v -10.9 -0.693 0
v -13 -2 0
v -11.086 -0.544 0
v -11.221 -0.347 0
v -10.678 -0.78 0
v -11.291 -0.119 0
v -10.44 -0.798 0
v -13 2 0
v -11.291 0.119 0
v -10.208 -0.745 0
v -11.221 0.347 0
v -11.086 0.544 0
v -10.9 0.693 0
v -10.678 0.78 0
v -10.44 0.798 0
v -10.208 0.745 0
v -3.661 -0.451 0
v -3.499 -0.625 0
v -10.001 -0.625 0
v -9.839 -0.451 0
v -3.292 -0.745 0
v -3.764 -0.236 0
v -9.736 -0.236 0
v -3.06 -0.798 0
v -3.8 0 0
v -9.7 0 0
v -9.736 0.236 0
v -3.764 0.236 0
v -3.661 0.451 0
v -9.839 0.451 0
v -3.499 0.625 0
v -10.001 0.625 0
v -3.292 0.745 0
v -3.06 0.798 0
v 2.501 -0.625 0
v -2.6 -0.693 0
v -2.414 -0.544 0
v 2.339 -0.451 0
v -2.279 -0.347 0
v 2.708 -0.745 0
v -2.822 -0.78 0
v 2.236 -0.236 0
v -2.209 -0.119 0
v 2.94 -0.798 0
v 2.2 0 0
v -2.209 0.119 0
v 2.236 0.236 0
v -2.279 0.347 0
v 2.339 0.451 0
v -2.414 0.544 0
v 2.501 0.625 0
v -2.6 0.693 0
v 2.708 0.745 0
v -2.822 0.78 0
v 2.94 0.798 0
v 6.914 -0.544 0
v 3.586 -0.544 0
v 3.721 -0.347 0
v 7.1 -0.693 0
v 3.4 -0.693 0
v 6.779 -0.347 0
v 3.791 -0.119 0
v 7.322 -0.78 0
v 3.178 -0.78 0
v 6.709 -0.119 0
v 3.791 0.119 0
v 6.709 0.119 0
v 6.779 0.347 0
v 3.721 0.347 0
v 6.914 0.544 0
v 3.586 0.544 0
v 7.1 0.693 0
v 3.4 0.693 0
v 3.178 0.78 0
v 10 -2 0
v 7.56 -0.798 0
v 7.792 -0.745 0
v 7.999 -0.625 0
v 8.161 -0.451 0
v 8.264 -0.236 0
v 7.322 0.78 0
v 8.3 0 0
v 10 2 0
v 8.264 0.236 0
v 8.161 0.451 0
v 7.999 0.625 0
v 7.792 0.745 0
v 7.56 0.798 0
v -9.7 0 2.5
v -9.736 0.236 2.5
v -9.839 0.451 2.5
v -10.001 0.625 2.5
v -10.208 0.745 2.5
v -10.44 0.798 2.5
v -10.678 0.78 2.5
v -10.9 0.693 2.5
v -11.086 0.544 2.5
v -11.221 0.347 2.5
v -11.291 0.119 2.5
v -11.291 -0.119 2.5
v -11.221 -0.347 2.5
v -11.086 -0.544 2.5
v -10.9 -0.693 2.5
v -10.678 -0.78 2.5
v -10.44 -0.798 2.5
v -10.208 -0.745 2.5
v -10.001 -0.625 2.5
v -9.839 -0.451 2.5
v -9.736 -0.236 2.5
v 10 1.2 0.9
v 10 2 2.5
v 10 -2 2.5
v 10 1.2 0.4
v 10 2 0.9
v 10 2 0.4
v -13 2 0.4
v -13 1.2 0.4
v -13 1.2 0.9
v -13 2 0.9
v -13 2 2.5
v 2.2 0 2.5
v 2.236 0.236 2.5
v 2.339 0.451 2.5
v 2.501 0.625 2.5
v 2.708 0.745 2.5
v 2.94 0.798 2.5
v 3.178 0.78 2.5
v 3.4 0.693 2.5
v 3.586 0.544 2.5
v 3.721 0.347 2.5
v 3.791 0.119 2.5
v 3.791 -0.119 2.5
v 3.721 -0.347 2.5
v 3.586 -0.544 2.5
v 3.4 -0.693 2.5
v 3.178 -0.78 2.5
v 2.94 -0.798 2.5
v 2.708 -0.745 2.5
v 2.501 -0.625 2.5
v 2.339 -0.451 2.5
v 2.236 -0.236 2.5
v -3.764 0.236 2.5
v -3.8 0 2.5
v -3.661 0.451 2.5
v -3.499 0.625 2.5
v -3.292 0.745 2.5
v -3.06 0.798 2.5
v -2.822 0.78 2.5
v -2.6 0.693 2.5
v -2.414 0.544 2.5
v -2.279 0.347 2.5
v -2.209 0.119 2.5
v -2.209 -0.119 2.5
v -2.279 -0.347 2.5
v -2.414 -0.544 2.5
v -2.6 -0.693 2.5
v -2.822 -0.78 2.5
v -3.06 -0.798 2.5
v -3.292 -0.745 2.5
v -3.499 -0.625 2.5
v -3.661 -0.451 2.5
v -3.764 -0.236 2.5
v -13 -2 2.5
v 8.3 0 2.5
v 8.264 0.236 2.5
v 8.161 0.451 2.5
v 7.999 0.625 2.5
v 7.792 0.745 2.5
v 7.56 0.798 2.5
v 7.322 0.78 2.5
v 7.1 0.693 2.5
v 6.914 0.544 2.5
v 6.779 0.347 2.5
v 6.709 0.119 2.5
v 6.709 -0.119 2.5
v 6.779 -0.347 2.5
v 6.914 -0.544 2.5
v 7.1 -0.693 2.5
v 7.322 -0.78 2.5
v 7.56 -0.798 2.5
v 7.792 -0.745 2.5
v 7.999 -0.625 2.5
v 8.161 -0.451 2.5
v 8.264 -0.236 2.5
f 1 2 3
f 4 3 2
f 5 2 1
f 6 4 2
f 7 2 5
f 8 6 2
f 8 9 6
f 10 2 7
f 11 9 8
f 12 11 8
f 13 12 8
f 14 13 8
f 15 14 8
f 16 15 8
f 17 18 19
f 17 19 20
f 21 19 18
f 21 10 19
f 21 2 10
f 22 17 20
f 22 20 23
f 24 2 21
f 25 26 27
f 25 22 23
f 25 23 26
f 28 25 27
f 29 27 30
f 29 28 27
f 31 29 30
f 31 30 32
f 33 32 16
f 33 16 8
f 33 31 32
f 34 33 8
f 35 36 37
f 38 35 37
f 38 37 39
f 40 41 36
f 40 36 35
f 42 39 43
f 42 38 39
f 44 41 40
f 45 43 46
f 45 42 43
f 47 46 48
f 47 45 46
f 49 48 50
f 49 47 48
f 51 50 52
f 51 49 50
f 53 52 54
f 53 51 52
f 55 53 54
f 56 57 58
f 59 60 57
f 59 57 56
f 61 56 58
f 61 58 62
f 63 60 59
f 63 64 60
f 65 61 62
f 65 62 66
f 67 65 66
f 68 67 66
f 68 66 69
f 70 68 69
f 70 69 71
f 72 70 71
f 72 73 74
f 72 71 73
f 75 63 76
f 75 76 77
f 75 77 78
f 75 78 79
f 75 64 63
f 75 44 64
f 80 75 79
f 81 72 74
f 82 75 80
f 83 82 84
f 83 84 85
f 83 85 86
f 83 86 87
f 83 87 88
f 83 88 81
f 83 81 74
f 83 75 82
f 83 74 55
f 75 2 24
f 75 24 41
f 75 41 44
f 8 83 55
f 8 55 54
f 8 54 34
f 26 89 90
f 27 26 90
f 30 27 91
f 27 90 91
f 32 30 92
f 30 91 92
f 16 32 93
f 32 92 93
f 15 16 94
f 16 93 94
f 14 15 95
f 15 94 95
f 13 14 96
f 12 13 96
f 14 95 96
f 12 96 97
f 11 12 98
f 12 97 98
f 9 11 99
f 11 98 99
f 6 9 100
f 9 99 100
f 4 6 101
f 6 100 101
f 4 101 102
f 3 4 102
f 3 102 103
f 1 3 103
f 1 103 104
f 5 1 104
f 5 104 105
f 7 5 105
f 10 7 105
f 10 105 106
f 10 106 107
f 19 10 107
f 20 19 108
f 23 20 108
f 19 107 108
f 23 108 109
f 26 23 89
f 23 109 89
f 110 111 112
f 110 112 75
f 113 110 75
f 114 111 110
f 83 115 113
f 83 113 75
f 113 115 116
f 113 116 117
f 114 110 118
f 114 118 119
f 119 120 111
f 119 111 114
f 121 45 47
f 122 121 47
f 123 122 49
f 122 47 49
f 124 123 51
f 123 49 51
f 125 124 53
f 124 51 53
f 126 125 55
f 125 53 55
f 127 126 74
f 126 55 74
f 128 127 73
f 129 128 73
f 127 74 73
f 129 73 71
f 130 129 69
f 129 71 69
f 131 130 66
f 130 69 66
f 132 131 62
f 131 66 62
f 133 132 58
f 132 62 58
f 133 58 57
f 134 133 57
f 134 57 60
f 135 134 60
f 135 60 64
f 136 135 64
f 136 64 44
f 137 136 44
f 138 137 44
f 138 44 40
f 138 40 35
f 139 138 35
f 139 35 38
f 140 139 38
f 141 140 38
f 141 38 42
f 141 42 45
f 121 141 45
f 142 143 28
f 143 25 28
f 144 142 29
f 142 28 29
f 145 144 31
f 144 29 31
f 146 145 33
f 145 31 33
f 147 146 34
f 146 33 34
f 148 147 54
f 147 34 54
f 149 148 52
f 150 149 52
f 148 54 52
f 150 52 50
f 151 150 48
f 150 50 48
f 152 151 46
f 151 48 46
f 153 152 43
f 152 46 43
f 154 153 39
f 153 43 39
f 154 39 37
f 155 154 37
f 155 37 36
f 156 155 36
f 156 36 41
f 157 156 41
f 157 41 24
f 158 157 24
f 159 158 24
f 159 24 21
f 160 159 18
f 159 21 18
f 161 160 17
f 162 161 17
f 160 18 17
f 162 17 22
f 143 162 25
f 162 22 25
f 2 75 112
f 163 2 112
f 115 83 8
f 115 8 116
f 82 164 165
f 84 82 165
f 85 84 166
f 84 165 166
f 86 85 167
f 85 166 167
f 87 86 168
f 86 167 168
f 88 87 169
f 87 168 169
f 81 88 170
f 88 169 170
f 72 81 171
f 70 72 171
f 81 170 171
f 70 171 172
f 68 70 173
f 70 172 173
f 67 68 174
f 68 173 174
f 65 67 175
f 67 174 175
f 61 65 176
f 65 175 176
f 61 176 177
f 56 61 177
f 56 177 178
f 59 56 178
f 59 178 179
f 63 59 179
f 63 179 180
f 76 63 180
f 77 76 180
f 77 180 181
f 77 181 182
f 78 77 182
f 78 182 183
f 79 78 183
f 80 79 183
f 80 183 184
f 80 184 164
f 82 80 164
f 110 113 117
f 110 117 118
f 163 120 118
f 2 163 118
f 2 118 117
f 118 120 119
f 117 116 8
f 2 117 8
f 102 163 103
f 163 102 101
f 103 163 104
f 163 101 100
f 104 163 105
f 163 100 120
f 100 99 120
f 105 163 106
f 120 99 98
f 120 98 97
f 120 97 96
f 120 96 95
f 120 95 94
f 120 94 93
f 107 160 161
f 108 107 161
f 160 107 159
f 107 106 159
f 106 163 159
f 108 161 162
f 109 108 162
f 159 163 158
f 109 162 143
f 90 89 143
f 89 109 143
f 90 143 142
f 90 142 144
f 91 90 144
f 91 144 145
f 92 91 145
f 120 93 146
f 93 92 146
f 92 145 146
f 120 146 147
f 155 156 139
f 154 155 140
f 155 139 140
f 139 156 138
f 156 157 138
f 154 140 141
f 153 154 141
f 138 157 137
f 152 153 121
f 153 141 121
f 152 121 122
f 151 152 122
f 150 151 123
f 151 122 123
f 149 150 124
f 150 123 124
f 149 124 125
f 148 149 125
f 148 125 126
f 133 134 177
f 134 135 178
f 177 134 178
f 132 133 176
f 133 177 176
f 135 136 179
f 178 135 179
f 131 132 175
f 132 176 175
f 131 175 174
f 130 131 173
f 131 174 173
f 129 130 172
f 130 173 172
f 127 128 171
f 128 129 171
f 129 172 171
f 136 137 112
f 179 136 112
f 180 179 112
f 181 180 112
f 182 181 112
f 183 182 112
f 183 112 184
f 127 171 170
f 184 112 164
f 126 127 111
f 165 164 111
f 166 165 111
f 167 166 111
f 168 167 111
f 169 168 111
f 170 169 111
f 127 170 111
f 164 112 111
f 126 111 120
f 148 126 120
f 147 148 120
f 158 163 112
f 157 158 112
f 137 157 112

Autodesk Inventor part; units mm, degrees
ref_plane "YZ Plane" through (0, 0, 0) normal (1, 0, 0) x (0, 1, 0)
ref_plane "XZ Plane" through (0, 0, 0) normal (0, 1, 0) x (-1, 0, 0)
ref_plane "XY Plane" through (0, 0, 0) normal (0, 0, 1) x (1, 0, 0)
sketch "スケッチ1" plane through (0, 0, 0) normal (0, 0, 1) x (1, 0, 0)
  line L0 (10, -2) -> (-10, -2)
  line L1 (-10, -2) -> (-10, 2)
  line L2 (-10, 2) -> (10, 2)
  line L3 (10, 2) -> (10, -2)
  line L4 (10, -2) -> (-10, 2) construction
  line L5 (-10, -2) -> (10, 2) construction
  point P0 (0, 0)
  dimension "d0" = 20
  dimension "d1" = 4
extrude "押し出し1" add sketch "スケッチ1" along normal blind 2.5
sketch "スケッチ2" plane through (-10, 2, 0) normal (0, 1, 0) x (1, 0, 0)
  line L0 (0, -1.9) -> (20, -1.9)
  line L1 (20, 0) -> (20, -2.5) projected
  line L2 (20, -1.9) -> (20, -1.65)
  line L3 (20, -1.65) -> (0, -1.65)
  line L4 (0, -1.65) -> (0, -2.15)
  line L5 (0, -2.15) -> (20, -2.15)
  line L6 (20, -2.15) -> (20, -1.9)
  point P0 (10, 0)
  dimension "d4" = 0.25
  dimension "d5" = 0.5
  dimension "d12" = 20
  dimension "d13" = 20
extrude "押し出し2" cut sketch "スケッチ2" against normal blind 0.5
sketch "スケッチ3" plane through (0, 0, 0) normal (0, 0, -1) x (-1, 0, 0)
  circle A0 centre (3, 0) radius 0.8
  circle A1 centre (-3, 0) radius 0.8
  point P0 (0, 0)
  dimension "d8" = 1.6
  dimension "d9" = 1.6
extrude "押し出し3" cut sketch "スケッチ3" against normal blind 5
sketch "スケッチ5" plane through (-10, -2, 0) normal (-1, 0, 0) x (0, 0, 1)
  line L0 (0, 0) -> (2.5, 0) projected
  line L1 (0, 4) -> (1.65, 4) projected
  line L2 (0, 0) -> (0, 4)
  line L3 (1.65, 3.5) -> (1.65, 4) projected
  line L4 (0, 4) -> (1.65, 4)
  line L5 (1.65, 4) -> (1.65, 3.5)
  line L6 (2.15, 4) -> (2.15, 3.5) projected
  line L7 (1.65, 3.5) -> (2.15, 3.5)
  line L8 (2.15, 3.5) -> (2.15, 4)
  line L9 (2.5, 0) -> (2.5, 4) projected
  line L10 (2.15, 4) -> (2.5, 4)
  line L11 (2.5, 4) -> (2.5, 0)
  line L12 (2.5, 0) -> (0, 0)
  point P0 (0, 2)
extrude "押し出し5" add sketch "スケッチ5" along normal blind 3
sketch "スケッチ6" plane through (0, 0, 2.5) normal (0, 0, 1) x (1, 0, 0)
  circle A0 centre (7.5, 0) radius 0.8
  circle A1 centre (-10.5, 0) radius 0.8
  point P0 (0, 0)
  dimension "d20" = 1.6
  dimension "d21" = 1.6
extrude "押し出し6" cut sketch "スケッチ6" against normal blind 3
sketch "スケッチ7" plane through (10, -2, 0) normal (1, 0, 0) x (0, 0, -1)
  line L0 (-2.15, 3.5) -> (-2.15, 4) projected
  line L1 (-2.15, 4) -> (-2.15, 3.2)
  line L2 (-2.15, 3.2) -> (-1.65, 3.2)
  line L3 (-1.65, 4) -> (-1.65, 3.5) projected
  line L4 (-1.65, 3.2) -> (-1.65, 4)
  line L5 (-1.65, 4) -> (-2.15, 4)
  point P0 (0, 2)
  dimension "d24" = 0.8
extrude "押し出し7" cut sketch "スケッチ7" against normal blind 30
sketch "スケッチ8" plane through (10, -2, 0) normal (1, 0, 0) x (0, 0, -1)
  line L0 (-1.65, 4) -> (0, 4) projected
  line L1 (-0.4, 4) -> (-0.4, 3.2)
  line L2 (-2.15, 3.2) -> (-1.65, 3.2) projected
  line L3 (-0.4, 3.2) -> (-0.9, 3.2)
  line L4 (-0.9, 3.2) -> (-0.9, 4)
  line L5 (-0.9, 4) -> (-0.4, 4)
  point P0 (0, 2)
  dimension "d27" = 0.5
extrude "押し出し8" cut sketch "スケッチ8" against normal blind 30
sketch "スケッチ9" plane through (10, -2, 0) normal (1, 0, 0) x (0, 0, -1)
  line L0 (-2.15, 4) -> (-2.5, 4) projected
  line L1 (-1.65, 4) -> (-1.65, 3.2) projected
  line L2 (-2.15, 4) -> (-1.65, 4)
  line L3 (-1.65, 4) -> (-1.65, 3.2)
  line L4 (-1.65, 3.2) -> (-2.15, 3.2)
  line L5 (-2.15, 3.2) -> (-2.15, 4)
  point P0 (0, 2)
extrude "押し出し9" add sketch "スケッチ9" against normal blind 23
properties part number "cutter_stopper" material "ABS プラスチック"
